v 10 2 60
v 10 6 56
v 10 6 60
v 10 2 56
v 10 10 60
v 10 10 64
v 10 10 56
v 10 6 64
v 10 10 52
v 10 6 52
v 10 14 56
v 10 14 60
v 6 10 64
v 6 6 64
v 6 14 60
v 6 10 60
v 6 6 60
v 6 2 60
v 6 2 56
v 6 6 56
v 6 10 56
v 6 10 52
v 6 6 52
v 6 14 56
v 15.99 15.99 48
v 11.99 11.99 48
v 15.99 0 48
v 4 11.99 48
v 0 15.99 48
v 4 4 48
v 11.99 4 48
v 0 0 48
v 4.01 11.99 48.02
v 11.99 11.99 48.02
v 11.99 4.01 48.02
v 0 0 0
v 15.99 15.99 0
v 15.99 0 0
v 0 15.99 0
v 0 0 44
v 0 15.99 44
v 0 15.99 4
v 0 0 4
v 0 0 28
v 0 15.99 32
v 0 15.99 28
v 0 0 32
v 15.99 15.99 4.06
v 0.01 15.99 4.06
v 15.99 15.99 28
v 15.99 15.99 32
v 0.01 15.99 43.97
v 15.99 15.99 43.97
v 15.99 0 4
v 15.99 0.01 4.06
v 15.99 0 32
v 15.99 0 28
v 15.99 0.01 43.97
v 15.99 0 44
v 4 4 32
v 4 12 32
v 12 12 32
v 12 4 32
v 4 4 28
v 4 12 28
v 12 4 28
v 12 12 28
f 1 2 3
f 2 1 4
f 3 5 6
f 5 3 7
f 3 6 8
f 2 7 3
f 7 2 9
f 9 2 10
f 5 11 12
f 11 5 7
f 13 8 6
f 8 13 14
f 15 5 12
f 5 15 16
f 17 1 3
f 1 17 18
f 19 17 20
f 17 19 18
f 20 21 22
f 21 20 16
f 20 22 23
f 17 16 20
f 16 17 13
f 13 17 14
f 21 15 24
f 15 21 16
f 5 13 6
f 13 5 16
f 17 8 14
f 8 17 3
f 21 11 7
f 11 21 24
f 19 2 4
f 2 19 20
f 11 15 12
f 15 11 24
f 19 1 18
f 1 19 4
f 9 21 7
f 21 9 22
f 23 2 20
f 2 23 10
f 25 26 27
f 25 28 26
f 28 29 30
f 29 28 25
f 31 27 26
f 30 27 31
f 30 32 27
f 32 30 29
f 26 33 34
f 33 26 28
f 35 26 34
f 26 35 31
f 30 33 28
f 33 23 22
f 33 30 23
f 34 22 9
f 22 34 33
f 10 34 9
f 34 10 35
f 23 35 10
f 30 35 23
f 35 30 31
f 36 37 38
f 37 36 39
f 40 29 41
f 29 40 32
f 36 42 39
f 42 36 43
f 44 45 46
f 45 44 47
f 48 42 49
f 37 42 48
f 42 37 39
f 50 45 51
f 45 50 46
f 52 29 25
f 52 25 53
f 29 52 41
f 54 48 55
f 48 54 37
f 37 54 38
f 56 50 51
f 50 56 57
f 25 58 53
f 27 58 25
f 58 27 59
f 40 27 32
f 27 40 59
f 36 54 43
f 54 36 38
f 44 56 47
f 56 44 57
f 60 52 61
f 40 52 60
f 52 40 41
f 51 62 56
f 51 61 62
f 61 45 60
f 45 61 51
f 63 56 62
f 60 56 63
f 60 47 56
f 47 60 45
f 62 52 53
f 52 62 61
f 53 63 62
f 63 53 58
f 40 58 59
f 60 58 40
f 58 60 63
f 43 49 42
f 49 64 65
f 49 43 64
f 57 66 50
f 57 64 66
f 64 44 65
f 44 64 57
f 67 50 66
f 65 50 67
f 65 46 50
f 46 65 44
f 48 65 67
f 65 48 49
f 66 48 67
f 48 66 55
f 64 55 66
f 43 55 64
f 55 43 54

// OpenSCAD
union () {
translate([6,6,60])
cube([4,4,4], centered = true);
translate([6,2,56])
cube([4,12,4]);
translate([6,6,52])
cube([4,4,4]);
} //King's Cross


//Begining of Cross's Base
difference() {
translate([4,4,48])
cube([8,8,4]);

union() {

//fix for certain edges
translate([0,11.99,48])
cube([16,.01,4]);
translate([11.99,0,48])
cube([.01,16,4]);
//Negative space for the cross's base
translate([4,12,48])
rotate([90,0,0])
linear_extrude(height = 8, center = false, convexity = 10, twist = 0) {
polygon(points=[[0,0],[2,4],[0,4]], paths=[[0,1,2]]);
}
translate([12,12,48])
rotate([90,0,-90])
linear_extrude(height = 8, center = false, convexity = 10, twist = 0) {
polygon(points=[[0,0],[2,4],[0,4]], paths=[[0,1,2]]);
}
translate([12,4,48])
rotate([90,0,-180])
linear_extrude(height = 8, center = false, convexity = 10, twist = 0) {
polygon(points=[[0,0],[2,4],[0,4]], paths=[[0,1,2]]);
}
translate([4,4,48])
rotate([90,0,90])
linear_extrude(height = 8, center = false, convexity = 10, twist = 0) {
polygon(points=[[0,0],[2,4],[0,4]], paths=[[0,1,2]]);
}


}

}

//End of Cross's Base

//Beginning of Body of Stand
difference() {
cube([16,16,48]);


union () {

//fix for certain edges
translate([0,15.99,0])
cube([16,.01,64]);
translate([15.99,0,0])
cube([.01,16,64]);

//Creating B1 - Starts at h=32
translate([0,16,32]) {
rotate([90,0,0])
linear_extrude(height = 16, center = false, convexity = 10, twist = 0) {
polygon(points=[[0,0],[4,0],[0,12]], paths=[[0,1,2]]);
}}
translate([16,16,32]) {
rotate([90,0,-90])
linear_extrude(height = 16, center = false, convexity = 10, twist = 0) {
polygon(points=[[0,0],[4,0],[0,12]], paths=[[0,1,2]]);
}}
translate([16,0,32]) {
rotate([90,0,-180])
linear_extrude(height = 16, center = false, convexity = 10, twist = 0) {
polygon(points=[[0,0],[4,0],[0,12]], paths=[[0,1,2]]);
}}
translate([0,0,32]) {
rotate([90,0,90])
linear_extrude(height = 16, center = false, convexity = 10, twist = 0) {
polygon(points=[[0,0],[4,0],[0,12]], paths=[[0,1,2]]);
}}

//Creating B2
translate([0,16,4]) {
rotate([90,0,0])
linear_extrude(height = 16, center = false, convexity = 10, twist = 0) {
polygon(points=[[0,0],[4,24],[0,24]], paths=[[0,1,2]]);
}}
translate([16,16,4]) {
rotate([90,0,-90])
linear_extrude(height = 16, center = false, convexity = 10, twist = 0) {
polygon(points=[[0,0],[4,24],[0,24]], paths=[[0,1,2]]);
}}
translate([16,0,4]) {
rotate([90,0,-180])
linear_extrude(height = 16, center = false, convexity = 10, twist = 0) {
polygon(points=[[0,0],[4,24],[0,24]], paths=[[0,1,2]]);
}}
translate([0,0,4]) {
rotate([90,0,90])
linear_extrude(height = 16, center = false, convexity = 10, twist = 0) {
polygon(points=[[0,0],[4,24],[0,24]], paths=[[0,1,2]]);
}}}}
